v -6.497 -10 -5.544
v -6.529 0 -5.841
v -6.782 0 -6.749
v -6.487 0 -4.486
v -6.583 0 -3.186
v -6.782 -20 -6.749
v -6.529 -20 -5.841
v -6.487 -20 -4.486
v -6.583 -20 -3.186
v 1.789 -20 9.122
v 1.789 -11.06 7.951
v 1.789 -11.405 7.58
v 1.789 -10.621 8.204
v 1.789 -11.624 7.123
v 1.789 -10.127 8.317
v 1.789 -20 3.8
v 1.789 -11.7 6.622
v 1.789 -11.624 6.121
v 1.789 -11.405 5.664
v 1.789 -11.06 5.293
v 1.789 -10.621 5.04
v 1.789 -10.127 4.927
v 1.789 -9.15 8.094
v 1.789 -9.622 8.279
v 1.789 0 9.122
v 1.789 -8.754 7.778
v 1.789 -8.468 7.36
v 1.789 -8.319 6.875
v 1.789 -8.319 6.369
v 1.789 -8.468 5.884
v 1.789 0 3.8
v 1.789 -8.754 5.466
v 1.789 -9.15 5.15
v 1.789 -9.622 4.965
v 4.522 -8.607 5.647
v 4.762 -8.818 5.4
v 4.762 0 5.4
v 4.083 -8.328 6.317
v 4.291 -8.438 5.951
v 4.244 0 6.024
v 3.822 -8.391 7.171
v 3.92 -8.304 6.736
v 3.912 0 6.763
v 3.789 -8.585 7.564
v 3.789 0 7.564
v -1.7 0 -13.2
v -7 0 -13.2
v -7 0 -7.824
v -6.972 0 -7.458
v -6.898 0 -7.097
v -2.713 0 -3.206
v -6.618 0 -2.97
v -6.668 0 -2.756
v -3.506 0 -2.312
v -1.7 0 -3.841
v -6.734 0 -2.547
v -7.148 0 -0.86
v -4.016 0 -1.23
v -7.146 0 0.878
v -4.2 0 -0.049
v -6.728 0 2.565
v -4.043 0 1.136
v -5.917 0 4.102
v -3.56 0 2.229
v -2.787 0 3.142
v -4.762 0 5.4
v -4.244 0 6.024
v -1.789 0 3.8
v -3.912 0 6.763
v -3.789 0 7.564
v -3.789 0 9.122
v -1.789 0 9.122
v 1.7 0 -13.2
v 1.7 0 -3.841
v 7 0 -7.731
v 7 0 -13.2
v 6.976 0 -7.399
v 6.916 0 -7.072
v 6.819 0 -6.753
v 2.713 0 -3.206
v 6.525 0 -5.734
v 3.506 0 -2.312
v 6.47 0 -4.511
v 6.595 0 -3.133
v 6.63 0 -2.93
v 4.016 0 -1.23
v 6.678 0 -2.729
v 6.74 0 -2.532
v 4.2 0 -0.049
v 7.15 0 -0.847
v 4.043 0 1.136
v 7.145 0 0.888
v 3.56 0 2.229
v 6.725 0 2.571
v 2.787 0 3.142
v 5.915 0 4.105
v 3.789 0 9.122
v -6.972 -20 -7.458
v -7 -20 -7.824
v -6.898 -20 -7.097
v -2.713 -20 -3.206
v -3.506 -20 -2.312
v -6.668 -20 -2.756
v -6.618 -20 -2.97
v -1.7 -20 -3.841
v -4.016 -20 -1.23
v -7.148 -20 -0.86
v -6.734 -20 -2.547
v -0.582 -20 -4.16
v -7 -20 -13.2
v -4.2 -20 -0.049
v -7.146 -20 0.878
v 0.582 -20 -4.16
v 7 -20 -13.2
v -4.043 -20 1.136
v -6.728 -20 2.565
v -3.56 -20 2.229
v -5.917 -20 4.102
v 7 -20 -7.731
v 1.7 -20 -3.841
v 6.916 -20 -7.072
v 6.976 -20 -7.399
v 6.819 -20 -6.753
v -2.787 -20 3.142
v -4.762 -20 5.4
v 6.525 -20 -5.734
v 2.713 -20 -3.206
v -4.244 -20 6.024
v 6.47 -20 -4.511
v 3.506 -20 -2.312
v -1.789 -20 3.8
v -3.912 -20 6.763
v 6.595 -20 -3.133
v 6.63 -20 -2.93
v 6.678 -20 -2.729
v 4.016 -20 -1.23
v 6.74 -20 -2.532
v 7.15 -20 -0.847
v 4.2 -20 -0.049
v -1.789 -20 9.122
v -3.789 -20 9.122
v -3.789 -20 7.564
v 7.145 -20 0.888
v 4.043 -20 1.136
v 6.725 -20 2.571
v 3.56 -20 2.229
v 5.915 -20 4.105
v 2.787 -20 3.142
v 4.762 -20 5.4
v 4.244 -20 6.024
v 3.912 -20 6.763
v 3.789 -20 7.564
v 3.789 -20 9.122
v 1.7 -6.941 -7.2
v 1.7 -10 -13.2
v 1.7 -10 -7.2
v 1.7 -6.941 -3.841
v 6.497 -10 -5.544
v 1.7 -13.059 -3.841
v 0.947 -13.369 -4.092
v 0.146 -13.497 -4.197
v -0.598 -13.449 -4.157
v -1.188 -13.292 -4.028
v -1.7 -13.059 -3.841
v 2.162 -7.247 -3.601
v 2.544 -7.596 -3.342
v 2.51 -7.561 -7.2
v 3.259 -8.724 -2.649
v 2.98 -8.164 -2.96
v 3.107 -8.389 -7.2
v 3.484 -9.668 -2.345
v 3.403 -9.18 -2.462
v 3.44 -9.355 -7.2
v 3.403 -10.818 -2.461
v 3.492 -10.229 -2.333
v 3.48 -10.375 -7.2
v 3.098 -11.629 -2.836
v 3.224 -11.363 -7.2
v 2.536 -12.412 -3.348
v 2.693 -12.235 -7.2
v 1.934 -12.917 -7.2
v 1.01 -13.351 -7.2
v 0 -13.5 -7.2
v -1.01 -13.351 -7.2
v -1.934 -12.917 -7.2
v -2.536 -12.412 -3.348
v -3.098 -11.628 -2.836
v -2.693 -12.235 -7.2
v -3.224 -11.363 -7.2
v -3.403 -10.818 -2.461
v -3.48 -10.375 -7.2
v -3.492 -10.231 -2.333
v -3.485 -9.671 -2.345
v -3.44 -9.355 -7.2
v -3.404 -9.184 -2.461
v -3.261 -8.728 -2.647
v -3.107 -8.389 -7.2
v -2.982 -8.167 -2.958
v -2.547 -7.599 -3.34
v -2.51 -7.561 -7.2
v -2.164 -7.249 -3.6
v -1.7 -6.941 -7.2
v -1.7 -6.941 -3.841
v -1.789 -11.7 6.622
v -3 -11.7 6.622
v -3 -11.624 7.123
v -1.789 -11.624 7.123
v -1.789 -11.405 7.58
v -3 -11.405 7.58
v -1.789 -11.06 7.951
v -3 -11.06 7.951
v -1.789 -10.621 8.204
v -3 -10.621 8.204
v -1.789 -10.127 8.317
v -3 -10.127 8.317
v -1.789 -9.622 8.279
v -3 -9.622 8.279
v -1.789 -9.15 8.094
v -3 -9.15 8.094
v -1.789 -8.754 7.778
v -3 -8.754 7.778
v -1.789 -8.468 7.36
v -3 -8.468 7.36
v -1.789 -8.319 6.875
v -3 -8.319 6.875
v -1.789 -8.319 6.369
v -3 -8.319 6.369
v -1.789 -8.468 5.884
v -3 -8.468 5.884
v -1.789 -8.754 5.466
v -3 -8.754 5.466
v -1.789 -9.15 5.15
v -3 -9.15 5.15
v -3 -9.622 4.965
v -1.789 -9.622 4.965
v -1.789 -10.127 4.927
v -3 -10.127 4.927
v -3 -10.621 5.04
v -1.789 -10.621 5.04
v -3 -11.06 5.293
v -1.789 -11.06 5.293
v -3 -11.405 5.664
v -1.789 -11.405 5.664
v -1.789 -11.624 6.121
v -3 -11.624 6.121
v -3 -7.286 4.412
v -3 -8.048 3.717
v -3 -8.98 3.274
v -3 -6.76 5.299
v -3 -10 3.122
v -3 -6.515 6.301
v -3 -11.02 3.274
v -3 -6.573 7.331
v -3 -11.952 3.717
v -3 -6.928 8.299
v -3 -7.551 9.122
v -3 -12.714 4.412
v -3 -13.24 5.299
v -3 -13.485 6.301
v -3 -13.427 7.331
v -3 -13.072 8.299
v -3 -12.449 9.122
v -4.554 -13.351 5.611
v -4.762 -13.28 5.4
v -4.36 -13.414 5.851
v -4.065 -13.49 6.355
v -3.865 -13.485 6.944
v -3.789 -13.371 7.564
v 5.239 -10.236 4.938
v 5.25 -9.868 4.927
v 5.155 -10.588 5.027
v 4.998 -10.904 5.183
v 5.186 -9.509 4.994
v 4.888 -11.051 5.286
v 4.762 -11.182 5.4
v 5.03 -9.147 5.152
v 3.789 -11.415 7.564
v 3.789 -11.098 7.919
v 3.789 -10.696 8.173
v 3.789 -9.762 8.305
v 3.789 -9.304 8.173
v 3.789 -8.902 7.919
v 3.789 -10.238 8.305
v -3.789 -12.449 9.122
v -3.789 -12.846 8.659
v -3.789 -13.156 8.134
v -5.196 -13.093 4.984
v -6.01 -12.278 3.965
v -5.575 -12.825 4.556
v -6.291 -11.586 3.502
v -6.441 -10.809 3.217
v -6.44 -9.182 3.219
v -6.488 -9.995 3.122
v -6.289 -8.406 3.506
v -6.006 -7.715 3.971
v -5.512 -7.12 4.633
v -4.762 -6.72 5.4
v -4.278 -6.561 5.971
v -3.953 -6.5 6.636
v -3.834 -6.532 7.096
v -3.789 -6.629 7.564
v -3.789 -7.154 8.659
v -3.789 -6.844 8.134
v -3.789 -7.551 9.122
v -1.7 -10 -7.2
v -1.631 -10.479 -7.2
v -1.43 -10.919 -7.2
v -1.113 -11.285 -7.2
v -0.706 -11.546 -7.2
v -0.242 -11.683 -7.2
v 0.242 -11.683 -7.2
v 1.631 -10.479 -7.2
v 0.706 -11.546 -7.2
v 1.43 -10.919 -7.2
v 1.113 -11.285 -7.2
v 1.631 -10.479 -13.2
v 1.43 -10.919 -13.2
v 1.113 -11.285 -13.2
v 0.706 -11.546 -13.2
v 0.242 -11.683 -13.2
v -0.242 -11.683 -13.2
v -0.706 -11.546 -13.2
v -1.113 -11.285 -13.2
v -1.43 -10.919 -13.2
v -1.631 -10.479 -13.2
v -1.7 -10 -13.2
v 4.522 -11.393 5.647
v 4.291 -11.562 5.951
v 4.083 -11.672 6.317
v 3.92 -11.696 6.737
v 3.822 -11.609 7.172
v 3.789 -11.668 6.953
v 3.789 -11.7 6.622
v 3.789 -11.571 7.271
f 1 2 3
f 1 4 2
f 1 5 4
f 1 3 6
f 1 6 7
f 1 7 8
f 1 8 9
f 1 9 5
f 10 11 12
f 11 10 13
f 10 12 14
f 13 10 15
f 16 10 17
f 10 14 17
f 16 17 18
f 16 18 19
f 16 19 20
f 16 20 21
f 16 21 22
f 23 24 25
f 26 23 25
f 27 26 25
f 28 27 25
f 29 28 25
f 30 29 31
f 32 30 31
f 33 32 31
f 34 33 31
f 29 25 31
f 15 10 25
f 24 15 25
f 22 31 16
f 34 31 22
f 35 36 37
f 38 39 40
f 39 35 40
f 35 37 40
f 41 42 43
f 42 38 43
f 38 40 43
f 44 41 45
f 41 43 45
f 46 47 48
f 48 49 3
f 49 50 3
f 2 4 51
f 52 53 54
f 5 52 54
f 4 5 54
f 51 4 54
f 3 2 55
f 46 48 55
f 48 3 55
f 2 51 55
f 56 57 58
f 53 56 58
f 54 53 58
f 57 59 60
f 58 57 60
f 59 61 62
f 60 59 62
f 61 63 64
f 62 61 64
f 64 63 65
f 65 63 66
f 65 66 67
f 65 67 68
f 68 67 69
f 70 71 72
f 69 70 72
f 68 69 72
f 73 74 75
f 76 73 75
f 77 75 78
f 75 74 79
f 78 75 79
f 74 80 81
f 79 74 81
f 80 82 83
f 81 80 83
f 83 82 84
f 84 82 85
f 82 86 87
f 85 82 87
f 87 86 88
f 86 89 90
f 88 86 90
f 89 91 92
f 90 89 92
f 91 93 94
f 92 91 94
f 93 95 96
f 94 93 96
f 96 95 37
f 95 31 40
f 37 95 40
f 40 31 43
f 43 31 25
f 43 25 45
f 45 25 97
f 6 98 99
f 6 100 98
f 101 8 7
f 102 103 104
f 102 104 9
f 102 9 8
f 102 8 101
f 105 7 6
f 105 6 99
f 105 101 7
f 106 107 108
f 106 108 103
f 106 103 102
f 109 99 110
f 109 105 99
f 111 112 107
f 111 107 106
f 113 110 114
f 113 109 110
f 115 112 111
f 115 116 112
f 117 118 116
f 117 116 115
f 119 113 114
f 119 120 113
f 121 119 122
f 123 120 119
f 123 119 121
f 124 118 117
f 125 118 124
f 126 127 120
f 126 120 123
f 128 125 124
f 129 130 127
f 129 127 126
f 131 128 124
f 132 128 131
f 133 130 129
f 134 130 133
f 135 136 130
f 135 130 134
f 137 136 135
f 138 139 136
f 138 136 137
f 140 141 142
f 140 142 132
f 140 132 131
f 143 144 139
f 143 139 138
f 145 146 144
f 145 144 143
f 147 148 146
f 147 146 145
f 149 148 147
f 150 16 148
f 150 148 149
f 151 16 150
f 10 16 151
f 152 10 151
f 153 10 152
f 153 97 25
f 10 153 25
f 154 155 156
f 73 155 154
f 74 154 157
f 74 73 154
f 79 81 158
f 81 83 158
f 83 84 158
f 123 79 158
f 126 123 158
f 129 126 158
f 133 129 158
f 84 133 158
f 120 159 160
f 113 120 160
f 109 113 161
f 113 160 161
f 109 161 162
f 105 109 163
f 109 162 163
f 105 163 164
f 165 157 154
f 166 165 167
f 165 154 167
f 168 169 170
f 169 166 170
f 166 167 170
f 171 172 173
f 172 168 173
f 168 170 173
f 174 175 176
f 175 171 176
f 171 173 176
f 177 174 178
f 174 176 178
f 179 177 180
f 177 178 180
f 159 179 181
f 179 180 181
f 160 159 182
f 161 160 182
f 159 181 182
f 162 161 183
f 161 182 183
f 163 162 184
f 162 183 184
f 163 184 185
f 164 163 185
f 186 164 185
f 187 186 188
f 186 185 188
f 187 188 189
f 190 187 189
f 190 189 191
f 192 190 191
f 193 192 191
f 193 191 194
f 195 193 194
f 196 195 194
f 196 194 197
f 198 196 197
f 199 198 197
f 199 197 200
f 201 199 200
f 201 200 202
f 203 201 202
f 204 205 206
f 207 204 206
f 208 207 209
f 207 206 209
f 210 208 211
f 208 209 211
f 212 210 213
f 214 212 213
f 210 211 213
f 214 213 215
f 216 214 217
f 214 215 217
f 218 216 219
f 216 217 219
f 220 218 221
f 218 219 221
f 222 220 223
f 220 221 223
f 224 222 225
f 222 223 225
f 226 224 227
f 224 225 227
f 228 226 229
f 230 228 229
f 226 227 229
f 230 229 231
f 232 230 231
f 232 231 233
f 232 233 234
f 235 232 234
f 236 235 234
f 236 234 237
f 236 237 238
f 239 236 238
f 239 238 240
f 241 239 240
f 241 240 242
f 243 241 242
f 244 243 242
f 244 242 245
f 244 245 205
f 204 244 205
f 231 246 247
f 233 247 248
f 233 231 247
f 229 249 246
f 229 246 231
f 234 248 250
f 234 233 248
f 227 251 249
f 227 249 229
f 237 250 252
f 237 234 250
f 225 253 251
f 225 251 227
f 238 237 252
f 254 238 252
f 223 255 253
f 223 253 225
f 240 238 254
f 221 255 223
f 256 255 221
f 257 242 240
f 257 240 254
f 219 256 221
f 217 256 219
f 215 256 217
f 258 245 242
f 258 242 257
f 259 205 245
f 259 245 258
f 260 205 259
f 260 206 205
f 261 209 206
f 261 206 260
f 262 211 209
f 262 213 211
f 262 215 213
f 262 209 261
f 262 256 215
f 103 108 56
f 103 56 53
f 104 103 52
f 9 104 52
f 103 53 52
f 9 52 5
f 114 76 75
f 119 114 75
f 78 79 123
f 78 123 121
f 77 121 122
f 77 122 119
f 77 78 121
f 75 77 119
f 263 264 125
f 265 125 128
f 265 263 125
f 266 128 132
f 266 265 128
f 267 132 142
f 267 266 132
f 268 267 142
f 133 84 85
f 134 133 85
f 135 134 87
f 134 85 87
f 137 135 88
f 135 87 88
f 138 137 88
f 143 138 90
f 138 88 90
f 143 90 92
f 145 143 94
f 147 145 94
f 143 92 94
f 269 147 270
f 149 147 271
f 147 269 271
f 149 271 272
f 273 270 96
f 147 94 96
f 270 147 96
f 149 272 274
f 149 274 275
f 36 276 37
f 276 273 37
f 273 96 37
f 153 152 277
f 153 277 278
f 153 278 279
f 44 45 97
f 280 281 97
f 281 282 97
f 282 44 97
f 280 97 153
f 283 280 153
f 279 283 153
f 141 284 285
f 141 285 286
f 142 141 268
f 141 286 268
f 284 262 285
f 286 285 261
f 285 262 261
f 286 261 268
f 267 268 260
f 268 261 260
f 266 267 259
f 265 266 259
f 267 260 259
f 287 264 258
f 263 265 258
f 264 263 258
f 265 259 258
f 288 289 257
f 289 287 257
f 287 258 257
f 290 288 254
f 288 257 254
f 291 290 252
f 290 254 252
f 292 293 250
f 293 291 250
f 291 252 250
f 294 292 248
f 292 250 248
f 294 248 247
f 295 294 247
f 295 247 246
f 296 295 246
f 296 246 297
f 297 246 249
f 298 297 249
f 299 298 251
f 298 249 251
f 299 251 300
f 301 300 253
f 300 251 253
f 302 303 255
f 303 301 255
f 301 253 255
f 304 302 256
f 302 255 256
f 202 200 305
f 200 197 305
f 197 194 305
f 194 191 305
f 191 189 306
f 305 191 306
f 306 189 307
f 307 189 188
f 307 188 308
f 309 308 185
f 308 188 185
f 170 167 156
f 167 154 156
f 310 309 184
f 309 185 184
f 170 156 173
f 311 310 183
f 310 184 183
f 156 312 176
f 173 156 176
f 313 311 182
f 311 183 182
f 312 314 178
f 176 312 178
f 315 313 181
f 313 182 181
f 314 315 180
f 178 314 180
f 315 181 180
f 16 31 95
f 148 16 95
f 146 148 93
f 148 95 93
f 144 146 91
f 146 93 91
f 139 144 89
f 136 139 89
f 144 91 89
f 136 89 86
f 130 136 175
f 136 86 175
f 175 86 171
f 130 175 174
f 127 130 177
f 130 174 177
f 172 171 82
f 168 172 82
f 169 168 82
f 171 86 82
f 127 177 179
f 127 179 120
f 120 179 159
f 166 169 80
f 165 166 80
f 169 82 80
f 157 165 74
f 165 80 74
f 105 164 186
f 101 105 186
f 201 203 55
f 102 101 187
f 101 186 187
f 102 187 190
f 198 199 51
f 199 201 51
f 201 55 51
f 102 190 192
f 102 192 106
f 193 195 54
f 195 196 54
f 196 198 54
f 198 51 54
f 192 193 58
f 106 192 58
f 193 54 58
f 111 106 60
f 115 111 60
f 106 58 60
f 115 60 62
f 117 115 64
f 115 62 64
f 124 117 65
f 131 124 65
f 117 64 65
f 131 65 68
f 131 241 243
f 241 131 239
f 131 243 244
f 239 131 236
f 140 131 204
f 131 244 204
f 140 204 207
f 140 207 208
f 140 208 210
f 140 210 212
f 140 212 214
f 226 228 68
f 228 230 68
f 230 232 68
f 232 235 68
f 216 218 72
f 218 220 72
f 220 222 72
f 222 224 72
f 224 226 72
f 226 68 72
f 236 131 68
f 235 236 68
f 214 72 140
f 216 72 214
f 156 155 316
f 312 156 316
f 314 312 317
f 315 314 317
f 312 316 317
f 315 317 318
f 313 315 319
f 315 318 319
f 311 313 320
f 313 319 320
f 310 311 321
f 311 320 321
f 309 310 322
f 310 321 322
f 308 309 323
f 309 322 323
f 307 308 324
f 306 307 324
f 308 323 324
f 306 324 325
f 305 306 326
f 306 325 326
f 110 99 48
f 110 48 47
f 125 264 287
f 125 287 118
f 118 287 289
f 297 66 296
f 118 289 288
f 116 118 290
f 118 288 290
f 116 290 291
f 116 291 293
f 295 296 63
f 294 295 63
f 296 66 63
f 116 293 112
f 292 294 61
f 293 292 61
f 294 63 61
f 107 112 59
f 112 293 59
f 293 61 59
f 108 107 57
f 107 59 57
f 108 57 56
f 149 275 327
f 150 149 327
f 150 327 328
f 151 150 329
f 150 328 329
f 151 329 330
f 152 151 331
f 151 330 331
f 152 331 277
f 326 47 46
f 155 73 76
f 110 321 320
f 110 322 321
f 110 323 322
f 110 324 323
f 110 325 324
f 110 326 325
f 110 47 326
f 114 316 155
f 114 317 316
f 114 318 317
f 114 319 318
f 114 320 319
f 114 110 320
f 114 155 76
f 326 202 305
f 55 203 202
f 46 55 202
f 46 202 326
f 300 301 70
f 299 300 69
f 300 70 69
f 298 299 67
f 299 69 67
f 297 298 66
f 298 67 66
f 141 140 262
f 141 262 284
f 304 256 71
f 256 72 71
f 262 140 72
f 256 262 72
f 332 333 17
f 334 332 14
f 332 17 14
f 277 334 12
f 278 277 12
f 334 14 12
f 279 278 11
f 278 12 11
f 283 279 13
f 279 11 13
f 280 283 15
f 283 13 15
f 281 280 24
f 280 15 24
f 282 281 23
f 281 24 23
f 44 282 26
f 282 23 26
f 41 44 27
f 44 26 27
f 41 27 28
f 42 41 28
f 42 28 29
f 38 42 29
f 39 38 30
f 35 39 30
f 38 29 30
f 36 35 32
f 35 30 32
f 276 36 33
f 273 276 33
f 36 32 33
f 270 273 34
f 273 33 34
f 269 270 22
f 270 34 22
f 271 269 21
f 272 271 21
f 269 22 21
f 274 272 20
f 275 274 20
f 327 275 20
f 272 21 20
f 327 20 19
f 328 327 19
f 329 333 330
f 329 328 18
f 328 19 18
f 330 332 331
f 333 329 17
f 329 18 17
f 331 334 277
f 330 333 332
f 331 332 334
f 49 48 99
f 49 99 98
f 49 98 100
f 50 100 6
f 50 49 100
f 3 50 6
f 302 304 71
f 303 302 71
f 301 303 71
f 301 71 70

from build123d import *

# Parameters (mm, degrees)
F1_DEPTH     = 20
F2_R         = 3.5
F2_R_2       = 1.7
F3_DEPTH     = 4
F4_DEPTH     = 25
F5_T1_DEPTH  = 20
F5_T6_DEPTH  = 12.1022846539
F5_S7_R      = 1.7
F5_T8_DEPTH  = 8
F5_T12_DEPTH = 12.1022846539
F5_S13_R     = 1.7
F5_T14_DEPTH = 8
F5_T18_DEPTH = 10.2630041323
F5_S19_R     = 3.5
F5_T20_DEPTH = 7
F5_T24_DEPTH = 10.2630041323
F5_S25_R     = 3.5
F5_T26_DEPTH = 7
F5_T27_DEPTH = 23.3663915102
F5_T29_DEPTH = 22.9020360067
F6_R         = 3.5
F6_R_2       = 1.7
F7_DEPTH     = 12
F8_DEPTH     = 12
F9_DEPTH     = 6
F10_DEPTH    = 10


# Not quite as in the source:
# - a fillet or chamfer that OpenCascade refuses, or shapes differently, is made with other operations: its cross-section is extruded or revolved along the edge and cut away or added


with BuildPart() as f1:
    # F0 (on Front) → F1 (new body)
    with BuildSketch(Plane.XZ):
        with BuildLine():
            ThreePointArc((-1.7, -3.8405728739), (-4.1997120304, -0.0491819207), (-1.7894736842, 3.7997084011))
            Line((-1.7894736842, 3.7997084011), (-1.7894736842, 9.1220820965))
            Line((-1.7894736842, 9.1220820965), (-3.7894736842, 9.1220820965))
            Line((-3.7894736842, 9.1220820965), (-3.7894736842, 6.1220820965))
            ThreePointArc((-3.7894736842, 6.1220820965), (-6.8557776995, 2.199616361), (-6.6439040907, -2.7746240166))
            add(Edge.make_bspline(
                [(-6.6356726702, -2.7942527112), (-6.6390399212, -2.7803089062), (-6.6413283577, -2.7774058988), (-6.6439040907, -2.7746240166)],
                knots=[0.9532514843, 0.9532514843, 0.9532514843, 0.9532514843, 1, 1, 1, 1], degree=3))
            add(Edge.make_bspline(
                [(-7, -7.2), (-6.7795680226, -6.7700727801), (-6.2785456929, -5.7974600377), (-6.5973790049, -2.9528269921), (-6.6356726702, -2.7942527112)],
                knots=[0, 0, 0, 0, 0.4216094964, 0.9532514843, 0.9532514843, 0.9532514843, 0.9532514843], degree=3))
            Line((-7, -7.2), (-7, -13.2))
            Line((-7, -13.2), (-1.7, -13.2))
            Line((-1.7, -13.2), (-1.7, -4.2))
            Line((-1.7, -4.2), (-1.7, -3.8405728739))
        make_face()
        with BuildLine():
            ThreePointArc((1.7, -3.8405728739), (0, -4.2), (-1.7, -3.8405728739))
            Line((-1.7, -3.8405728739), (-1.7, -4.2))
            Line((-1.7, -4.2), (-1.7, -13.2))
            Line((-1.7, -13.2), (1.7, -13.2))
            Line((1.7, -13.2), (1.7, -4.2))
            Line((1.7, -4.2), (1.7, -3.8405728739))
        make_face()
        with BuildLine():
            ThreePointArc((1.7894736842, 3.7997084011), (4.1997120304, -0.0491819207), (1.7, -3.8405728739))
            Line((1.7, -3.8405728739), (1.7, -4.2))
            Line((1.7, -4.2), (1.7, -13.2))
            Line((1.7, -13.2), (7, -13.2))
            Line((7, -13.2), (7, -7.2))
            add(Edge.make_bspline(
                [(7, -7.2), (6.7871491537, -6.6864508711), (6.3058923114, -5.5253136877), (6.5175995563, -3.7720698099), (6.6356726702, -2.7942527112)],
                knots=[0, 0, 0, 0, 0.4422811845, 1, 1, 1, 1], degree=3))
            ThreePointArc((6.6356726702, -2.7942527112), (6.8590214848, 2.1894803656), (3.7894736842, 6.1220820965))
            Line((3.7894736842, 6.1220820965), (3.7894736842, 9.1220820965))
            Line((3.7894736842, 9.1220820965), (1.7894736842, 9.1220820965))
            Line((1.7894736842, 9.1220820965), (1.7894736842, 3.7997084011))
        make_face()
        with BuildLine():
            add(Edge.make_bspline(
                [(-6.6356726702, -2.7942527112), (-6.6390399212, -2.7803089062), (-6.6413283577, -2.7774058988), (-6.6439040907, -2.7746240166)],
                knots=[0.9532514843, 0.9532514843, 0.9532514843, 0.9532514843, 1, 1, 1, 1], degree=3))
            ThreePointArc((-6.6439040907, -2.7746240166), (-6.6397956338, -2.7844414056), (-6.6356726702, -2.7942527112))
        make_face()
    extrude(amount=F1_DEPTH)

    # F2 (on face) → F3 (cut)
    with BuildSketch(Plane(origin=(-7, 0, 0), x_dir=(0, -1, 0), z_dir=(-1, 0, 0))):
        with Locations((10, 6.622)):
            Circle(F2_R)
        with Locations((10, 6.622)):
            Circle(F2_R_2, mode=Mode.SUBTRACT)
    extrude(amount=-F3_DEPTH, mode=Mode.SUBTRACT)

    # F2 (on face) → F4 (cut)
    with BuildSketch(Plane(origin=(-7, 0, 0), x_dir=(0, -1, 0), z_dir=(-1, 0, 0))):
        with Locations((10, 6.622)):
            Circle(F2_R_2)
    extrude(amount=-F4_DEPTH, mode=Mode.SUBTRACT)

    # F5: fillet of radius 3 on 8 edges, made by hand

    # F5_s2 → F5_t1 (join)
    with BuildSketch(Plane.XZ):
        with BuildLine():
            ThreePointArc((-6.7483493849, -2.5087886996), (-6.6395606645, -2.8691274316), (-6.5767127025, -3.2402461743))
            Line((-6.5767127025, -3.2402461743), (-6.2781272304, -3.2087696206))
            ThreePointArc((-6.2781272304, -3.2087696206), (-6.304537605, -2.9799785061), (-6.343821894, -2.723774473))
            Line((-6.343821894, -2.723774473), (-6.3589651198, -2.6777323732))
            ThreePointArc((-6.3589651198, -2.6777323732), (-6.4145893512, -2.5416001874), (-6.466927581, -2.4041663985))
            Line((-6.466927581, -2.4041663985), (-6.7483493849, -2.5087886996))
        make_face()
        with BuildLine():
            ThreePointArc((6.5887317904, -3.1834061265), (6.6509501418, -2.8334452349), (6.754091056, -2.4932898281))
            Line((6.754091056, -2.4932898281), (6.4724298111, -2.3893138658))
            ThreePointArc((6.4724298111, -2.3893138658), (6.4175024363, -2.534235691), (6.3589651198, -2.6777323732))
            Line((6.3589651198, -2.6777323732), (6.3375979172, -2.7582596669))
            ThreePointArc((6.3375979172, -2.7582596669), (6.3141276632, -2.9530960278), (6.290534619, -3.1484417941))
            Line((6.290534619, -3.1484417941), (6.5887317904, -3.1834061265))
        make_face()
    extrude(amount=F5_T1_DEPTH)


with BuildPart() as f5_tool4:
    # F5_s5 → F5_t6 (new body)
    with BuildSketch(Plane.XZ.offset(7.8977153461)):
        with BuildLine():
            ThreePointArc((4.792775332, 5.3724803189), (4.0514647707, 6.385428811), (3.7890736842, 7.6129290813))
            Line((3.7890736842, 7.6129290813), (3.4888336842, 7.6129290813))
            ThreePointArc((3.4888336842, 7.6129290813), (3.4892336842, 6.8675055889), (3.4892336842, 6.1220820965))
            Line((3.4892336842, 6.1220820965), (3.6314526316, 5.8667912731))
            ThreePointArc((3.6314526316, 5.8667912731), (4.1279416848, 5.5287236777), (4.5929054968, 5.1484354427))
            Line((4.5929054968, 5.1484354427), (4.792775332, 5.3724803189))
        make_face()
    extrude(amount=F5_T6_DEPTH)

    # F5_s7 → F5_t8 (cut, symmetric)
    with BuildSketch(Plane.YZ.offset(4.1)):
        with Locations((-10, 6.622)):
            Circle(F5_S7_R)
    extrude(amount=F5_T8_DEPTH, both=True, mode=Mode.SUBTRACT)


with BuildPart() as f1_1:
    add(f1.part)

    # F5_t3: union F5_tool4
    add(f5_tool4.part)


with BuildPart() as f5_tool10:
    # F5_s11 → F5_t12 (new body)
    with BuildSketch(Plane.XZ):
        with BuildLine():
            ThreePointArc((4.792775332, 5.3724803189), (4.0514647707, 6.385428811), (3.7890736842, 7.6129290813))
            Line((3.7890736842, 7.6129290813), (3.4888336842, 7.6129290813))
            ThreePointArc((3.4888336842, 7.6129290813), (3.4892336842, 6.8675055889), (3.4892336842, 6.1220820965))
            Line((3.4892336842, 6.1220820965), (3.6314526316, 5.8667912731))
            ThreePointArc((3.6314526316, 5.8667912731), (4.1279416848, 5.5287236777), (4.5929054968, 5.1484354427))
            Line((4.5929054968, 5.1484354427), (4.792775332, 5.3724803189))
        make_face()
    extrude(amount=F5_T12_DEPTH)

    # F5_s13 → F5_t14 (cut, symmetric)
    with BuildSketch(Plane.YZ.offset(4.1)):
        with Locations((-10, 6.622)):
            Circle(F5_S13_R)
    extrude(amount=F5_T14_DEPTH, both=True, mode=Mode.SUBTRACT)


with BuildPart() as f1_2:
    add(f1_1.part)

    # F5_t9: union F5_tool10
    add(f5_tool10.part)


with BuildPart() as f5_tool16:
    # F5_s17 → F5_t18 (new body)
    with BuildSketch(Plane.XZ):
        with BuildLine():
            ThreePointArc((-3.7890736842, 7.6129290813), (-4.0514647707, 6.385428811), (-4.792775332, 5.3724803189))
            Line((-4.792775332, 5.3724803189), (-4.5929054968, 5.1484354427))
            ThreePointArc((-4.5929054968, 5.1484354427), (-4.1279416848, 5.5287236777), (-3.6314526316, 5.8667912731))
            Line((-3.6314526316, 5.8667912731), (-3.4892336842, 6.1220820965))
            ThreePointArc((-3.4892336842, 6.1220820965), (-3.4892336842, 6.8675055889), (-3.4888336842, 7.6129290813))
            Line((-3.4888336842, 7.6129290813), (-3.7890736842, 7.6129290813))
        make_face()
    extrude(amount=F5_T18_DEPTH)

    # F5_s19 → F5_t20 (cut, symmetric)
    with BuildSketch(Plane.YZ.offset(-4.1)):
        with Locations((-10, 6.622)):
            Circle(F5_S19_R)
    extrude(amount=F5_T20_DEPTH, both=True, mode=Mode.SUBTRACT)


with BuildPart() as f1_3:
    add(f1_2.part)

    # F5_t15: union F5_tool16
    add(f5_tool16.part)


with BuildPart() as f5_tool22:
    # F5_s23 → F5_t24 (new body)
    with BuildSketch(Plane.XZ.offset(9.7369958677)):
        with BuildLine():
            ThreePointArc((-4.792775332, 5.3724803189), (-4.0514647707, 6.385428811), (-3.7890736842, 7.6129290813))
            Line((-3.7890736842, 7.6129290813), (-3.4888336842, 7.6129290813))
            ThreePointArc((-3.4888336842, 7.6129290813), (-3.4892336842, 6.8675055889), (-3.4892336842, 6.1220820965))
            Line((-3.4892336842, 6.1220820965), (-3.6314526316, 5.8667912731))
            ThreePointArc((-3.6314526316, 5.8667912731), (-4.1279416848, 5.5287236777), (-4.5929054968, 5.1484354427))
            Line((-4.5929054968, 5.1484354427), (-4.792775332, 5.3724803189))
        make_face()
    extrude(amount=F5_T24_DEPTH)

    # F5_s25 → F5_t26 (cut, symmetric)
    with BuildSketch(Plane.YZ.offset(-4.1)):
        with Locations((-10, 6.622)):
            Circle(F5_S25_R)
    extrude(amount=F5_T26_DEPTH, both=True, mode=Mode.SUBTRACT)


with BuildPart() as f1_4:
    add(f1_3.part)

    # F5_t21: union F5_tool22
    add(f5_tool22.part)

    # F5_s28 → F5_t27 (cut)
    with BuildSketch(Plane.XZ.offset(-1.6831957551)):
        with BuildLine():
            ThreePointArc((-7.0004, -7.8732781832), (-6.9416848839, -7.2824101234), (-6.7678360085, -6.7146521667))
            Line((-6.7678360085, -6.7146521667), (-7.0448196093, -6.5987895651))
            ThreePointArc((-7.0448196093, -6.5987895651), (-7.148871707, -6.8283644641), (-7.2671697753, -7.0630169034))
            Line((-7.2671697753, -7.0630169034), (-7.30024, -7.2))
            ThreePointArc((-7.30024, -7.2), (-7.30024, -7.5366390916), (-7.30064, -7.8732781832))
            Line((-7.30064, -7.8732781832), (-7.0004, -7.8732781832))
        make_face()
    extrude(amount=F5_T27_DEPTH, mode=Mode.SUBTRACT)

    # F5_s30 → F5_t29 (cut)
    with BuildSketch(Plane.XZ.offset(-1.4510180034)):
        with BuildLine():
            ThreePointArc((6.8044646756, -6.7135604089), (6.9510099307, -7.2380620544), (7.0004, -7.7804070635))
            Line((7.0004, -7.7804070635), (7.30064, -7.7804070635))
            ThreePointArc((7.30064, -7.7804070635), (7.30024, -7.4902035318), (7.30024, -7.2))
            Line((7.30024, -7.2), (7.277360411, -7.0850423555))
            ThreePointArc((7.277360411, -7.0850423555), (7.178454263, -6.8447161783), (7.0851111432, -6.6068757434))
            Line((7.0851111432, -6.6068757434), (6.8044646756, -6.7135604089))
        make_face()
    extrude(amount=F5_T29_DEPTH, mode=Mode.SUBTRACT)

    # F6 (on face) → F7 (cut)
    with BuildSketch(Plane(origin=(0, 0, -13.2), x_dir=(1, 0, 0), z_dir=(0, 0, -1))):
        with Locations((0, 10)):
            Circle(F6_R)
        with Locations((0, 10)):
            Circle(F6_R_2, mode=Mode.SUBTRACT)
    extrude(amount=-F7_DEPTH, mode=Mode.SUBTRACT)

    # F8 (cut): a face of the model
    f8_faces = [f1_4.faces().sort_by_distance(p)[0] for p in [
        (0, -10, -13.2),
    ]]
    extrude(f8_faces, amount=-F8_DEPTH, mode=Mode.SUBTRACT)

    # F6 (on face) → F9 (join)
    with BuildSketch(Plane(origin=(0, 0, -13.2), x_dir=(1, 0, 0), z_dir=(0, 0, -1))):
        with Locations((0, 10)):
            Circle(F6_R)
        with Locations((0, 10)):
            Circle(F6_R_2, mode=Mode.SUBTRACT)
    extrude(amount=-F9_DEPTH)

    # F0 (on Front) → F10 (cut)
    with BuildSketch(Plane.XZ):
        with BuildLine():
            ThreePointArc((1.7, -3.8405728739), (0, -4.2), (-1.7, -3.8405728739))
            Line((-1.7, -3.8405728739), (-1.7, -4.2))
            Line((-1.7, -4.2), (-1.7, -13.2))
            Line((-1.7, -13.2), (1.7, -13.2))
            Line((1.7, -13.2), (1.7, -4.2))
            Line((1.7, -4.2), (1.7, -3.8405728739))
        make_face()
    extrude(amount=F10_DEPTH, mode=Mode.SUBTRACT)


solid = f1_4.part
